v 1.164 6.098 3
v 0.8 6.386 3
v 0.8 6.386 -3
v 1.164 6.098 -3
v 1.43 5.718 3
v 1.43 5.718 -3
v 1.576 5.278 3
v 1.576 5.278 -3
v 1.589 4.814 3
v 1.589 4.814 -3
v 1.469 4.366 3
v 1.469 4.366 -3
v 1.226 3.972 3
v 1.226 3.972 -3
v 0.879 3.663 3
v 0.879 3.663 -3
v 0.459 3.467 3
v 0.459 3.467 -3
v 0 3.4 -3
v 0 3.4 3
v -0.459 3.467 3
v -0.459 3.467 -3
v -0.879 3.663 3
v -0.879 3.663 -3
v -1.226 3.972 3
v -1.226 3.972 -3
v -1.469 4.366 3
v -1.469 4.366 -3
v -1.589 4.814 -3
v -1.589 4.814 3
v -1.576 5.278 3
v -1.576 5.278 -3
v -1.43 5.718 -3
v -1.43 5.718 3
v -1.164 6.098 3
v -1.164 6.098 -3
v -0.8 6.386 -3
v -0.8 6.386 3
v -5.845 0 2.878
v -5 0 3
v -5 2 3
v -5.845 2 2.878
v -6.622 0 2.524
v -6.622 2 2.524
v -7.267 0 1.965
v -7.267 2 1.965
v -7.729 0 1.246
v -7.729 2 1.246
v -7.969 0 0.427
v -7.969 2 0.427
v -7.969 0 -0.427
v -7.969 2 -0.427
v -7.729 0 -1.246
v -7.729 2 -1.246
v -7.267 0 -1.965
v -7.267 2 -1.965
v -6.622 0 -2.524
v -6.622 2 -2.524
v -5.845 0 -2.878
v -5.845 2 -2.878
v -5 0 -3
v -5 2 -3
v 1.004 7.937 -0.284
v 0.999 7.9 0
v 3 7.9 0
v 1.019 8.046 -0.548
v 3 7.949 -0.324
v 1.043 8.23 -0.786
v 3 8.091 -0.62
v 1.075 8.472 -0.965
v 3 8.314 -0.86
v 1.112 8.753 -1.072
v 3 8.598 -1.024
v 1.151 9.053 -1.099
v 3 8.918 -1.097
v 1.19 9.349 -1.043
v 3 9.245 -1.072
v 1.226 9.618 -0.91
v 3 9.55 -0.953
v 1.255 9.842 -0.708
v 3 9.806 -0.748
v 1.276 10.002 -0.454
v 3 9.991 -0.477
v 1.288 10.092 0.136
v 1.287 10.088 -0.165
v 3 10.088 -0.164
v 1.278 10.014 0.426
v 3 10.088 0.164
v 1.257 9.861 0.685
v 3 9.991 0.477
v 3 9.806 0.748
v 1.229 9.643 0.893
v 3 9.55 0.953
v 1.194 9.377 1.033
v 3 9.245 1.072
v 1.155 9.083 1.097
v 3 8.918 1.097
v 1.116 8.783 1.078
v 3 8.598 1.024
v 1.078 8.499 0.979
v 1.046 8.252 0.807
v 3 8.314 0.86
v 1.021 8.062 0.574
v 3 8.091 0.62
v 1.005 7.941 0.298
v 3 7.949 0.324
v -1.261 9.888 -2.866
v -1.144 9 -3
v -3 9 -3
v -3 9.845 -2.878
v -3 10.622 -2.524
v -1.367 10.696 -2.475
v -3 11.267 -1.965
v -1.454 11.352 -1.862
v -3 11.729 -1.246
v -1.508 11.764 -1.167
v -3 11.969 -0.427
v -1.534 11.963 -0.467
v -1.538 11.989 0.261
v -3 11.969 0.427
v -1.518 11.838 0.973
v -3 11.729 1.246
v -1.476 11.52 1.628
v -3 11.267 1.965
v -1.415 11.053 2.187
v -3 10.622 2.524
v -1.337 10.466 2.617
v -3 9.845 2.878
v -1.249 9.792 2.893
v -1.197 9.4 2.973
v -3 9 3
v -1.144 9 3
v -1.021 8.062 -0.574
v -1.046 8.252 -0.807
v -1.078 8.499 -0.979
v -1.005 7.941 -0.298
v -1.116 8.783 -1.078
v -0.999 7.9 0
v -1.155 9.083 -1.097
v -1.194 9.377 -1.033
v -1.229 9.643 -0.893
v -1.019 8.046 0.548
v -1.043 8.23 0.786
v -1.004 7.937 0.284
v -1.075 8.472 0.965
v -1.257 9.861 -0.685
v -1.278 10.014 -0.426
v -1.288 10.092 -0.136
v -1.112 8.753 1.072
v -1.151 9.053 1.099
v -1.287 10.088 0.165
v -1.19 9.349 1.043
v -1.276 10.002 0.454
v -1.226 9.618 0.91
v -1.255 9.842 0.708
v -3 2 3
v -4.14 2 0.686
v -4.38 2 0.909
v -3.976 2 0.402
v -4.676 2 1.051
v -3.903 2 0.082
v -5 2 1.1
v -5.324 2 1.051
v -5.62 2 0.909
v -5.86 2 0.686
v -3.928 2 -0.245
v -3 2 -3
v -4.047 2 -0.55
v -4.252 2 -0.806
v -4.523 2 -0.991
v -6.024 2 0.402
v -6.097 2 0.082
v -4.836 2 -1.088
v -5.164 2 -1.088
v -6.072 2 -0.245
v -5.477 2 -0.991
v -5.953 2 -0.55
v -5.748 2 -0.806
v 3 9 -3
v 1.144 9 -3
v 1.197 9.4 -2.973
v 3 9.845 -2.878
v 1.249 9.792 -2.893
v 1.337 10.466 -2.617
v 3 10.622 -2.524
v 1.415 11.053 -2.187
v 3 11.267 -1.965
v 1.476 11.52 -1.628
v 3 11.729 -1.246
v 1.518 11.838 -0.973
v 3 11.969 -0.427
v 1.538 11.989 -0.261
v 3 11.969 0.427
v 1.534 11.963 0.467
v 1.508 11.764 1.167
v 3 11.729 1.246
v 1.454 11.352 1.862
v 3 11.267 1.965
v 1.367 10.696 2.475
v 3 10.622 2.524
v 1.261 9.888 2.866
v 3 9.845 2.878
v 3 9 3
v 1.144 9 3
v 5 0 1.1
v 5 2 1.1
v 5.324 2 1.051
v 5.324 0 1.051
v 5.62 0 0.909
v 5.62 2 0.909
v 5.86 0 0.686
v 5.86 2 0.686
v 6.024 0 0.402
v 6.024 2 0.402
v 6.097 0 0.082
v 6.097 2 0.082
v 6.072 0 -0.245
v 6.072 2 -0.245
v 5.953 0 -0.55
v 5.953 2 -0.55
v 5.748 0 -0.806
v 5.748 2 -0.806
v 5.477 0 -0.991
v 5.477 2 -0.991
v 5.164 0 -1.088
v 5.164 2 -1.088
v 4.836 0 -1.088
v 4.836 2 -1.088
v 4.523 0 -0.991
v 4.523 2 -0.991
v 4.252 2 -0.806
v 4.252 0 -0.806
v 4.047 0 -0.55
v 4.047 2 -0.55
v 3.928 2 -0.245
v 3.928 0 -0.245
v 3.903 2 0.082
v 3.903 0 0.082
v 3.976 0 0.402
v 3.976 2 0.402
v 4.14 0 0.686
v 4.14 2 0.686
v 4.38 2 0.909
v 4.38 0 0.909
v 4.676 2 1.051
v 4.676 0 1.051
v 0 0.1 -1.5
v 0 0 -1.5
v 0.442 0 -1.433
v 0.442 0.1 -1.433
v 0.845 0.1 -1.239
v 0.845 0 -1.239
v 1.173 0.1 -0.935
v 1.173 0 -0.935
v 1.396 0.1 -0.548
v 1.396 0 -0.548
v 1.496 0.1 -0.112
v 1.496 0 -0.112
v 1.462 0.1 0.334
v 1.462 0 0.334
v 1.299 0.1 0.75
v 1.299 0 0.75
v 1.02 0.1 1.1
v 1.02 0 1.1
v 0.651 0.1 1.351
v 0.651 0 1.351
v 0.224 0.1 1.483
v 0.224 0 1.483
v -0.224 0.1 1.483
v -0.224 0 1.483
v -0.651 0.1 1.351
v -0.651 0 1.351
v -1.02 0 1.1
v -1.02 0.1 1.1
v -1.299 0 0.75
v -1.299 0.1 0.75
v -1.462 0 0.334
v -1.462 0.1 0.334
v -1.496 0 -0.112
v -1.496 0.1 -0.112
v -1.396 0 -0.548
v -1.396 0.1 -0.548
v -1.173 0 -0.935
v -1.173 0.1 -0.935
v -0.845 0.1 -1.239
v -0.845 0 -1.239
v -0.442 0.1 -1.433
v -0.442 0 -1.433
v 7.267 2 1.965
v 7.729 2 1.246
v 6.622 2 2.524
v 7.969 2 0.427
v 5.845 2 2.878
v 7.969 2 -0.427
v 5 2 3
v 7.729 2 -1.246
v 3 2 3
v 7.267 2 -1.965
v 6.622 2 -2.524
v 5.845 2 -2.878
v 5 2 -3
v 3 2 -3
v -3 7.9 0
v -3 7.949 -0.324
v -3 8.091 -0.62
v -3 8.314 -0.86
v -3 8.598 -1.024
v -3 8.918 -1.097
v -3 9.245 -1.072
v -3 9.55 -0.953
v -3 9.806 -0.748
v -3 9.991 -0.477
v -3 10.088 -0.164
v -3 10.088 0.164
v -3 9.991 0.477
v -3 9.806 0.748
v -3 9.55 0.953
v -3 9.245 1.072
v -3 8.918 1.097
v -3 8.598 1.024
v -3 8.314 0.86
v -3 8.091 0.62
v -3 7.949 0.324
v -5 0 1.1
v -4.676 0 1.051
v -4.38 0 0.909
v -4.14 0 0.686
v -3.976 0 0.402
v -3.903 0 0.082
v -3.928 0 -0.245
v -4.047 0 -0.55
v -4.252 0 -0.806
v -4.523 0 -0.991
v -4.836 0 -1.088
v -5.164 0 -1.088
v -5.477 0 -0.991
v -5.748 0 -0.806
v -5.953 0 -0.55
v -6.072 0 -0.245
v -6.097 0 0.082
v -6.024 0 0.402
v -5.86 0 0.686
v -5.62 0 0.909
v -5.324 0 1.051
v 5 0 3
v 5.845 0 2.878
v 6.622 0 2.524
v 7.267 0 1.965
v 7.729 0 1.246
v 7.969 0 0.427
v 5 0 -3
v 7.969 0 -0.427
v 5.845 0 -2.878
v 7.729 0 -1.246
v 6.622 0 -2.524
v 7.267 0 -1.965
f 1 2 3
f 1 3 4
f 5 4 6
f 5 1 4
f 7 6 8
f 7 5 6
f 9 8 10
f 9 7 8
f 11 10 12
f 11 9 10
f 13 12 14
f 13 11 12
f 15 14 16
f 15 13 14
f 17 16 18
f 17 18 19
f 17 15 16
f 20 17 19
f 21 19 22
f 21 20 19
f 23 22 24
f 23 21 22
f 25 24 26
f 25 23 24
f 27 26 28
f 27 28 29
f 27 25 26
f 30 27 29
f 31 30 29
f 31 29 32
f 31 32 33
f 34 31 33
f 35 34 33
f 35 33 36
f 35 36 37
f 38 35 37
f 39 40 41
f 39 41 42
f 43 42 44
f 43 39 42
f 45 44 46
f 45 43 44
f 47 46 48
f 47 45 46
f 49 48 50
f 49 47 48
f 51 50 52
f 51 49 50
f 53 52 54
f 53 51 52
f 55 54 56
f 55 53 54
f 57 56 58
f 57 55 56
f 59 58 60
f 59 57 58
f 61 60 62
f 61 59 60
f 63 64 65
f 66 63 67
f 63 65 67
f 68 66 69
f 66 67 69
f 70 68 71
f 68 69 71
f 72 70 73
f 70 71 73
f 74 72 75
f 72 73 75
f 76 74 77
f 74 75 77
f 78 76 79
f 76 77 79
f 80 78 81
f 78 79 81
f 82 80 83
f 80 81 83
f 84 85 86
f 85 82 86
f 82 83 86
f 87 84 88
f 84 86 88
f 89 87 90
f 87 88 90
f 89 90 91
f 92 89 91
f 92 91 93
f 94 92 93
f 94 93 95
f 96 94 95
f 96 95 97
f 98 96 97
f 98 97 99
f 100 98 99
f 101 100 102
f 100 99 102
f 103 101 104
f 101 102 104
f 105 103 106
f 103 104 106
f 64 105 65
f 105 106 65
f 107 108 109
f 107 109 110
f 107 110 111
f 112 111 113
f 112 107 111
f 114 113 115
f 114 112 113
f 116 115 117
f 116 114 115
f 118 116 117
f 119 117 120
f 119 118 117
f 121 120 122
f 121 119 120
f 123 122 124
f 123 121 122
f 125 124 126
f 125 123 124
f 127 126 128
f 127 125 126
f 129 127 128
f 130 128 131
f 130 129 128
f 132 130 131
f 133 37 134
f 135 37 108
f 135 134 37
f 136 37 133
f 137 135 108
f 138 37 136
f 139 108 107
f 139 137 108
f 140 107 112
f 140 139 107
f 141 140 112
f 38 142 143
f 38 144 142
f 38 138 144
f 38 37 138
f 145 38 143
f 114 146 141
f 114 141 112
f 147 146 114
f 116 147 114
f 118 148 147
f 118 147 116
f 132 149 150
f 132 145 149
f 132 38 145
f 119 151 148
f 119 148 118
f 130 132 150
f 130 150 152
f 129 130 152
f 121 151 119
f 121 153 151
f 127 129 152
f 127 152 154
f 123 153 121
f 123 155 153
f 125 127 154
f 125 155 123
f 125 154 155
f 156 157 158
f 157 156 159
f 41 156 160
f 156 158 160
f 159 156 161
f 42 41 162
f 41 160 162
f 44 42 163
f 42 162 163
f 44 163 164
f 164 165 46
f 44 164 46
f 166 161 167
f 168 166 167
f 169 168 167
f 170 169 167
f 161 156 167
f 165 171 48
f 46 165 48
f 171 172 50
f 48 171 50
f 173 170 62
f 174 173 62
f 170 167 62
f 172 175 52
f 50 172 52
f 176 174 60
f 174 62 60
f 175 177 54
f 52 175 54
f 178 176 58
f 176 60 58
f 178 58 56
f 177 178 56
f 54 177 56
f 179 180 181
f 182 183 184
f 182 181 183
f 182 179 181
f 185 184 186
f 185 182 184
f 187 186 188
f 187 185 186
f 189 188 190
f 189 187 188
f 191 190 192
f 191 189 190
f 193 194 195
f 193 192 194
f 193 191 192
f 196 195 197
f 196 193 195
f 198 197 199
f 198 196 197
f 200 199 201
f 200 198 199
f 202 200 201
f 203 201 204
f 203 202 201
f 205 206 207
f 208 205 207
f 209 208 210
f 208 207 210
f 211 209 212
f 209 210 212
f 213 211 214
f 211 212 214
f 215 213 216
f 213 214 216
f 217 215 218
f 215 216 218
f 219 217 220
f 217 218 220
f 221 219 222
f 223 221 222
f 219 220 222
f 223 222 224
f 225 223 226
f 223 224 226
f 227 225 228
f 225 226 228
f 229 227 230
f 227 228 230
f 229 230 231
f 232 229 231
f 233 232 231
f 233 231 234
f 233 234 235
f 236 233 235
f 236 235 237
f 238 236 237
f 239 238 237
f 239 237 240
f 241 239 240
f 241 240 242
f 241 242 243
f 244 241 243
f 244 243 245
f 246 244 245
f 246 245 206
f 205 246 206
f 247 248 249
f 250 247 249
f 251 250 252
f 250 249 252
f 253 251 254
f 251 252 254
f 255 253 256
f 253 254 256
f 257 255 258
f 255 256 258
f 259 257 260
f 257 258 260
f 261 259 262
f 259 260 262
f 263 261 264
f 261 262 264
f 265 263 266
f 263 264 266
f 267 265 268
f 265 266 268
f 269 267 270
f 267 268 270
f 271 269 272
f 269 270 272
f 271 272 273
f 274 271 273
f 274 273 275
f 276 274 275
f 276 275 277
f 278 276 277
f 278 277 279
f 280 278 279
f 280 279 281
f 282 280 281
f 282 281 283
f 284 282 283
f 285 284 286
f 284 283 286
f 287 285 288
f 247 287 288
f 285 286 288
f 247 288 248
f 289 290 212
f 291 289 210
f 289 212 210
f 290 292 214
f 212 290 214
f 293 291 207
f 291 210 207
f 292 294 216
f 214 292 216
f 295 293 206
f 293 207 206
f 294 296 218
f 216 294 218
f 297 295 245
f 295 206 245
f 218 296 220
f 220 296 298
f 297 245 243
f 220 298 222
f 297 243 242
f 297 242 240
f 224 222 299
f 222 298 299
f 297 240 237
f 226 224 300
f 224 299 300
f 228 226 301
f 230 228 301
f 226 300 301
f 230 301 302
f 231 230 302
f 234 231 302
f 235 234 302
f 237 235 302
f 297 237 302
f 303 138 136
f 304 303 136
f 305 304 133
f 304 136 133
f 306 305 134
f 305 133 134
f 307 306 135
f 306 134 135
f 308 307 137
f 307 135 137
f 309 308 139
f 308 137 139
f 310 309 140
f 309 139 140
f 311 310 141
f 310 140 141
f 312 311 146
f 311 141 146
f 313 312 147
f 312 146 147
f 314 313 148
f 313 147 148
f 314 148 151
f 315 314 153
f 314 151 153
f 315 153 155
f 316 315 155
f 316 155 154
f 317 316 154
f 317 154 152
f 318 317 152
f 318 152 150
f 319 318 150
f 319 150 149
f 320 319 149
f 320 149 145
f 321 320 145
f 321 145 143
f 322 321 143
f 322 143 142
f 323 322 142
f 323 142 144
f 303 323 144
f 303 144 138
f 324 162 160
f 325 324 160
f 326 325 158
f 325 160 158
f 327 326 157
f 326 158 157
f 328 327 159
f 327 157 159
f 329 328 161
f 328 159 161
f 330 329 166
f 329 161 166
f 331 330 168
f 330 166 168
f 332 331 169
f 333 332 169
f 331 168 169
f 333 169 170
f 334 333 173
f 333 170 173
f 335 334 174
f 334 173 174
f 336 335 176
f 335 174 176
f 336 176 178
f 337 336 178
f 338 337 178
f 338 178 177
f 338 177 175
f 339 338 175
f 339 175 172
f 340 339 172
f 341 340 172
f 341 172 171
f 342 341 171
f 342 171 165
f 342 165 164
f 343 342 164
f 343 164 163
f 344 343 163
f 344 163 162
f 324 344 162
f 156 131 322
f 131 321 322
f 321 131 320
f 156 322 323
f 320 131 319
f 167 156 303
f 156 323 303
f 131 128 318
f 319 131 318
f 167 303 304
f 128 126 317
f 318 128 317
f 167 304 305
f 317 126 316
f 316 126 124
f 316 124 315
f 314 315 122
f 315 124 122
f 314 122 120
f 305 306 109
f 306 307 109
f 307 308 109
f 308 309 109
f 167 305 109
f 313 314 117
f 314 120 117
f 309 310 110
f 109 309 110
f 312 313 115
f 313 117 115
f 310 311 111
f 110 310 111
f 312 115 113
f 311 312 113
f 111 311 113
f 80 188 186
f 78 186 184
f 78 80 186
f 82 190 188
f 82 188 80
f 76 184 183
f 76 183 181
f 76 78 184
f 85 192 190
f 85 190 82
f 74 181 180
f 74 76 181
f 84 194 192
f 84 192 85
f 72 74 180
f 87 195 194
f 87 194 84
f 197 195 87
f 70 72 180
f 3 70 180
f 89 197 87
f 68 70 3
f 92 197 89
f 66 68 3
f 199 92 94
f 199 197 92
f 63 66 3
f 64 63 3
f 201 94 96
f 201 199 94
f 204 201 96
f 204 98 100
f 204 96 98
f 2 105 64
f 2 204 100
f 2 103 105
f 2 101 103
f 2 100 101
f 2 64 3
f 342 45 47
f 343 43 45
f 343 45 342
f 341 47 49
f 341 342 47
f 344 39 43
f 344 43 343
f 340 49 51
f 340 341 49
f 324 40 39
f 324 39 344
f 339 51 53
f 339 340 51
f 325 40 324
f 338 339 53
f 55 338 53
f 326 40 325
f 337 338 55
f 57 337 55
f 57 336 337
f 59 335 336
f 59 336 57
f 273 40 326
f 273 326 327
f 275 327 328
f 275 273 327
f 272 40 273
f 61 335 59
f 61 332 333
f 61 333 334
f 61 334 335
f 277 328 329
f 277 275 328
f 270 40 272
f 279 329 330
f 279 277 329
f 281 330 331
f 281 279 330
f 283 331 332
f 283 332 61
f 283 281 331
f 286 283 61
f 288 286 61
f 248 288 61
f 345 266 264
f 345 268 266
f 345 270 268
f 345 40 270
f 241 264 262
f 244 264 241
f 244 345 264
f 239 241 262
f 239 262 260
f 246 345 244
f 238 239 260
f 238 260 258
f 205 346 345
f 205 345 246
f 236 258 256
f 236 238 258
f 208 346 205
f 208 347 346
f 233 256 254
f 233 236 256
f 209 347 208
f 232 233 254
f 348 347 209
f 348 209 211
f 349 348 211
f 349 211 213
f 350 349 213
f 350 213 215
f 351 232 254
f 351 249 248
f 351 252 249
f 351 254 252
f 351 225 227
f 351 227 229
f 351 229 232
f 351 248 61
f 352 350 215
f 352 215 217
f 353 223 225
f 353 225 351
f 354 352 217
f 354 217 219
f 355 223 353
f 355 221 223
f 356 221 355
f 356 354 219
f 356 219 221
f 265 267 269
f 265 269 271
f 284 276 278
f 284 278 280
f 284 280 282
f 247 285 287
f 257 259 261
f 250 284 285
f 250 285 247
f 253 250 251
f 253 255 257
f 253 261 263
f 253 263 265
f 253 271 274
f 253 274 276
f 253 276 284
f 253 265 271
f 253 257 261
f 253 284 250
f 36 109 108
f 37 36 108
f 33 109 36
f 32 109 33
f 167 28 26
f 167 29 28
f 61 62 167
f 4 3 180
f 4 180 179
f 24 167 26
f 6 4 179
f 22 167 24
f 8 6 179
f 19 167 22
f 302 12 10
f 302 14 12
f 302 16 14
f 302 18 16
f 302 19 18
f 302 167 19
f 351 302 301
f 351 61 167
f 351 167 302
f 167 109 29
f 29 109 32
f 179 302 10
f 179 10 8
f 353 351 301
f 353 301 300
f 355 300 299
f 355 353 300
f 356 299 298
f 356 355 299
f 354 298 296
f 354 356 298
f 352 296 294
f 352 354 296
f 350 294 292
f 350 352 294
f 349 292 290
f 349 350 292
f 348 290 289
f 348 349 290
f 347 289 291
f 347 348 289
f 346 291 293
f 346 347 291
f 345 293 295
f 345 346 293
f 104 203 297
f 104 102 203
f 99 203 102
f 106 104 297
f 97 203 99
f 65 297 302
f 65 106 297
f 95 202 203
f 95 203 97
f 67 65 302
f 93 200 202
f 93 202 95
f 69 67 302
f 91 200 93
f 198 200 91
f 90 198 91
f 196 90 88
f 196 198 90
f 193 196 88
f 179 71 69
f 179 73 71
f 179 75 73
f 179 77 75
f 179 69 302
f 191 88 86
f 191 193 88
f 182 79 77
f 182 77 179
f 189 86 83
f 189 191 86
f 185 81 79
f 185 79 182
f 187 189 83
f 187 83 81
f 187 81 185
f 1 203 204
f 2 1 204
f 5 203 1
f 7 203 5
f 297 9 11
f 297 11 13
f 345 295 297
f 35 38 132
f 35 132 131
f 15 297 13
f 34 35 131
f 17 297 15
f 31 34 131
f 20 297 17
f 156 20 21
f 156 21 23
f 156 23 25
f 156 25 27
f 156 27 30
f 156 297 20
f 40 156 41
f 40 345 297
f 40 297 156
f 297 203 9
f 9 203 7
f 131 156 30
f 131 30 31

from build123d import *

# Parameters (mm, degrees)
EXTRUDE_1_DEPTH     = 2
SKETCH_2_W          = 6
SKETCH_2_H          = 12
EXTRUDE_2_DEPTH     = 3
FILLET_1_RADIUS     = 3
FILLET_1_LENGTH     = 6
CUT_EXTRUDE_START   = -6
CUT_EXTRUDE_1_DEPTH = 6
SKETCH_4_R          = 1.1
CUT_EXTRUDE_2_DEPTH = 28
SKETCH_7_R          = 1.1
CUT_EXTRUDE_5_DEPTH = 3.5
SKETCH_9_R          = 1.5
CUT_EXTRUDE_7_DEPTH = 0.1


# Read off the part's stored shape, not the designer's step: 切除-拉伸1
with BuildPart() as part:
    # 草图1 → 凸台-拉伸1 (new body)
    with BuildSketch(Plane(origin=(0, 0, 0), x_dir=(1, 0, 0), z_dir=(0, 1, 0))):
        with BuildLine():
            Line((-5, 3), (5, 3))
            ThreePointArc((5, 3), (8, 0), (5, -3))
            Line((5, -3), (-5, -3))
            ThreePointArc((-5, -3), (-8, 0), (-5, 3))
        make_face()
    extrude(amount=EXTRUDE_1_DEPTH)

    # 草图2 → 凸台-拉伸2 (add, symmetric)
    with BuildSketch(Plane(origin=(0, 0, 0), x_dir=(0, 0, -1), z_dir=(1, 0, 0))):
        with Locations((0, 6)):
            Rectangle(SKETCH_2_W, SKETCH_2_H)
    extrude(amount=EXTRUDE_2_DEPTH, both=True)

    # 圆角1: full round fillet: the end face becomes a half cylinder, R = half its width
    fillet_1_face = Plane((0, 12, 0), x_dir=(1, 0, 0), z_dir=(0, 1, 0))  # on the end face: x along it, z out of the body
    fillet_1_slab = fillet_1_face.offset(-FILLET_1_RADIUS / 2) * Box(FILLET_1_LENGTH, 2 * FILLET_1_RADIUS, FILLET_1_RADIUS, mode=Mode.PRIVATE)  # the body's end, R deep
    fillet_1_round = Plane((0, 9, 0), x_dir=(0, 1, 0), z_dir=(1, 0, 0)) * Cylinder(FILLET_1_RADIUS, FILLET_1_LENGTH, mode=Mode.PRIVATE)  # its axis R under the face
    add(fillet_1_slab - fillet_1_round, mode=Mode.SUBTRACT)

    # 切除-拉伸1 outline → 切除-拉伸1 (cut)
    with BuildSketch(Plane(origin=(0, 0, -3), x_dir=(-1, 0, 0), z_dir=(0, 0, -1)).offset(CUT_EXTRUDE_START)):
        with BuildLine():
            ThreePointArc((-0.8, 6.385640646), (0, 3.4), (0.8, 6.385640646))
            Line((0.8, 6.385640646), (1.7488232, 13.59266837))
            Line((1.7488232, 13.59266837), (-1.7488232, 13.59266837))
            Line((-1.7488232, 13.59266837), (-0.8, 6.385640646))
        make_face()
    extrude(amount=CUT_EXTRUDE_1_DEPTH, mode=Mode.SUBTRACT)

    # 草图4 → 切除-拉伸2 (cut)
    with BuildSketch(Plane(origin=(3, 0, 0), x_dir=(0, 0, -1), z_dir=(1, 0, 0))):
        with Locations(Location((0, 9, 0), (0, 0, 270))):
            Circle(SKETCH_4_R)
    extrude(amount=-CUT_EXTRUDE_2_DEPTH, mode=Mode.SUBTRACT)

    # 草图7 → 切除-拉伸5 (cut)
    with BuildSketch(Plane(origin=(0, 2, 0), x_dir=(1, 0, 0), z_dir=(0, 1, 0))):
        with Locations(Location((5, 0, 0), (0, 0, 270))):
            Circle(SKETCH_7_R)
        with Locations(Location((-5, 0, 0), (0, 0, 270))):
            Circle(SKETCH_7_R)
    extrude(amount=-CUT_EXTRUDE_5_DEPTH, mode=Mode.SUBTRACT)

    # 草图9 → 切除-拉伸7 (cut)
    with BuildSketch(Plane.XZ):
        with Locations(Location((0, 0, 0), (0, 0, 270))):
            Circle(SKETCH_9_R)
    extrude(amount=-CUT_EXTRUDE_7_DEPTH, mode=Mode.SUBTRACT)


solid = part.part
